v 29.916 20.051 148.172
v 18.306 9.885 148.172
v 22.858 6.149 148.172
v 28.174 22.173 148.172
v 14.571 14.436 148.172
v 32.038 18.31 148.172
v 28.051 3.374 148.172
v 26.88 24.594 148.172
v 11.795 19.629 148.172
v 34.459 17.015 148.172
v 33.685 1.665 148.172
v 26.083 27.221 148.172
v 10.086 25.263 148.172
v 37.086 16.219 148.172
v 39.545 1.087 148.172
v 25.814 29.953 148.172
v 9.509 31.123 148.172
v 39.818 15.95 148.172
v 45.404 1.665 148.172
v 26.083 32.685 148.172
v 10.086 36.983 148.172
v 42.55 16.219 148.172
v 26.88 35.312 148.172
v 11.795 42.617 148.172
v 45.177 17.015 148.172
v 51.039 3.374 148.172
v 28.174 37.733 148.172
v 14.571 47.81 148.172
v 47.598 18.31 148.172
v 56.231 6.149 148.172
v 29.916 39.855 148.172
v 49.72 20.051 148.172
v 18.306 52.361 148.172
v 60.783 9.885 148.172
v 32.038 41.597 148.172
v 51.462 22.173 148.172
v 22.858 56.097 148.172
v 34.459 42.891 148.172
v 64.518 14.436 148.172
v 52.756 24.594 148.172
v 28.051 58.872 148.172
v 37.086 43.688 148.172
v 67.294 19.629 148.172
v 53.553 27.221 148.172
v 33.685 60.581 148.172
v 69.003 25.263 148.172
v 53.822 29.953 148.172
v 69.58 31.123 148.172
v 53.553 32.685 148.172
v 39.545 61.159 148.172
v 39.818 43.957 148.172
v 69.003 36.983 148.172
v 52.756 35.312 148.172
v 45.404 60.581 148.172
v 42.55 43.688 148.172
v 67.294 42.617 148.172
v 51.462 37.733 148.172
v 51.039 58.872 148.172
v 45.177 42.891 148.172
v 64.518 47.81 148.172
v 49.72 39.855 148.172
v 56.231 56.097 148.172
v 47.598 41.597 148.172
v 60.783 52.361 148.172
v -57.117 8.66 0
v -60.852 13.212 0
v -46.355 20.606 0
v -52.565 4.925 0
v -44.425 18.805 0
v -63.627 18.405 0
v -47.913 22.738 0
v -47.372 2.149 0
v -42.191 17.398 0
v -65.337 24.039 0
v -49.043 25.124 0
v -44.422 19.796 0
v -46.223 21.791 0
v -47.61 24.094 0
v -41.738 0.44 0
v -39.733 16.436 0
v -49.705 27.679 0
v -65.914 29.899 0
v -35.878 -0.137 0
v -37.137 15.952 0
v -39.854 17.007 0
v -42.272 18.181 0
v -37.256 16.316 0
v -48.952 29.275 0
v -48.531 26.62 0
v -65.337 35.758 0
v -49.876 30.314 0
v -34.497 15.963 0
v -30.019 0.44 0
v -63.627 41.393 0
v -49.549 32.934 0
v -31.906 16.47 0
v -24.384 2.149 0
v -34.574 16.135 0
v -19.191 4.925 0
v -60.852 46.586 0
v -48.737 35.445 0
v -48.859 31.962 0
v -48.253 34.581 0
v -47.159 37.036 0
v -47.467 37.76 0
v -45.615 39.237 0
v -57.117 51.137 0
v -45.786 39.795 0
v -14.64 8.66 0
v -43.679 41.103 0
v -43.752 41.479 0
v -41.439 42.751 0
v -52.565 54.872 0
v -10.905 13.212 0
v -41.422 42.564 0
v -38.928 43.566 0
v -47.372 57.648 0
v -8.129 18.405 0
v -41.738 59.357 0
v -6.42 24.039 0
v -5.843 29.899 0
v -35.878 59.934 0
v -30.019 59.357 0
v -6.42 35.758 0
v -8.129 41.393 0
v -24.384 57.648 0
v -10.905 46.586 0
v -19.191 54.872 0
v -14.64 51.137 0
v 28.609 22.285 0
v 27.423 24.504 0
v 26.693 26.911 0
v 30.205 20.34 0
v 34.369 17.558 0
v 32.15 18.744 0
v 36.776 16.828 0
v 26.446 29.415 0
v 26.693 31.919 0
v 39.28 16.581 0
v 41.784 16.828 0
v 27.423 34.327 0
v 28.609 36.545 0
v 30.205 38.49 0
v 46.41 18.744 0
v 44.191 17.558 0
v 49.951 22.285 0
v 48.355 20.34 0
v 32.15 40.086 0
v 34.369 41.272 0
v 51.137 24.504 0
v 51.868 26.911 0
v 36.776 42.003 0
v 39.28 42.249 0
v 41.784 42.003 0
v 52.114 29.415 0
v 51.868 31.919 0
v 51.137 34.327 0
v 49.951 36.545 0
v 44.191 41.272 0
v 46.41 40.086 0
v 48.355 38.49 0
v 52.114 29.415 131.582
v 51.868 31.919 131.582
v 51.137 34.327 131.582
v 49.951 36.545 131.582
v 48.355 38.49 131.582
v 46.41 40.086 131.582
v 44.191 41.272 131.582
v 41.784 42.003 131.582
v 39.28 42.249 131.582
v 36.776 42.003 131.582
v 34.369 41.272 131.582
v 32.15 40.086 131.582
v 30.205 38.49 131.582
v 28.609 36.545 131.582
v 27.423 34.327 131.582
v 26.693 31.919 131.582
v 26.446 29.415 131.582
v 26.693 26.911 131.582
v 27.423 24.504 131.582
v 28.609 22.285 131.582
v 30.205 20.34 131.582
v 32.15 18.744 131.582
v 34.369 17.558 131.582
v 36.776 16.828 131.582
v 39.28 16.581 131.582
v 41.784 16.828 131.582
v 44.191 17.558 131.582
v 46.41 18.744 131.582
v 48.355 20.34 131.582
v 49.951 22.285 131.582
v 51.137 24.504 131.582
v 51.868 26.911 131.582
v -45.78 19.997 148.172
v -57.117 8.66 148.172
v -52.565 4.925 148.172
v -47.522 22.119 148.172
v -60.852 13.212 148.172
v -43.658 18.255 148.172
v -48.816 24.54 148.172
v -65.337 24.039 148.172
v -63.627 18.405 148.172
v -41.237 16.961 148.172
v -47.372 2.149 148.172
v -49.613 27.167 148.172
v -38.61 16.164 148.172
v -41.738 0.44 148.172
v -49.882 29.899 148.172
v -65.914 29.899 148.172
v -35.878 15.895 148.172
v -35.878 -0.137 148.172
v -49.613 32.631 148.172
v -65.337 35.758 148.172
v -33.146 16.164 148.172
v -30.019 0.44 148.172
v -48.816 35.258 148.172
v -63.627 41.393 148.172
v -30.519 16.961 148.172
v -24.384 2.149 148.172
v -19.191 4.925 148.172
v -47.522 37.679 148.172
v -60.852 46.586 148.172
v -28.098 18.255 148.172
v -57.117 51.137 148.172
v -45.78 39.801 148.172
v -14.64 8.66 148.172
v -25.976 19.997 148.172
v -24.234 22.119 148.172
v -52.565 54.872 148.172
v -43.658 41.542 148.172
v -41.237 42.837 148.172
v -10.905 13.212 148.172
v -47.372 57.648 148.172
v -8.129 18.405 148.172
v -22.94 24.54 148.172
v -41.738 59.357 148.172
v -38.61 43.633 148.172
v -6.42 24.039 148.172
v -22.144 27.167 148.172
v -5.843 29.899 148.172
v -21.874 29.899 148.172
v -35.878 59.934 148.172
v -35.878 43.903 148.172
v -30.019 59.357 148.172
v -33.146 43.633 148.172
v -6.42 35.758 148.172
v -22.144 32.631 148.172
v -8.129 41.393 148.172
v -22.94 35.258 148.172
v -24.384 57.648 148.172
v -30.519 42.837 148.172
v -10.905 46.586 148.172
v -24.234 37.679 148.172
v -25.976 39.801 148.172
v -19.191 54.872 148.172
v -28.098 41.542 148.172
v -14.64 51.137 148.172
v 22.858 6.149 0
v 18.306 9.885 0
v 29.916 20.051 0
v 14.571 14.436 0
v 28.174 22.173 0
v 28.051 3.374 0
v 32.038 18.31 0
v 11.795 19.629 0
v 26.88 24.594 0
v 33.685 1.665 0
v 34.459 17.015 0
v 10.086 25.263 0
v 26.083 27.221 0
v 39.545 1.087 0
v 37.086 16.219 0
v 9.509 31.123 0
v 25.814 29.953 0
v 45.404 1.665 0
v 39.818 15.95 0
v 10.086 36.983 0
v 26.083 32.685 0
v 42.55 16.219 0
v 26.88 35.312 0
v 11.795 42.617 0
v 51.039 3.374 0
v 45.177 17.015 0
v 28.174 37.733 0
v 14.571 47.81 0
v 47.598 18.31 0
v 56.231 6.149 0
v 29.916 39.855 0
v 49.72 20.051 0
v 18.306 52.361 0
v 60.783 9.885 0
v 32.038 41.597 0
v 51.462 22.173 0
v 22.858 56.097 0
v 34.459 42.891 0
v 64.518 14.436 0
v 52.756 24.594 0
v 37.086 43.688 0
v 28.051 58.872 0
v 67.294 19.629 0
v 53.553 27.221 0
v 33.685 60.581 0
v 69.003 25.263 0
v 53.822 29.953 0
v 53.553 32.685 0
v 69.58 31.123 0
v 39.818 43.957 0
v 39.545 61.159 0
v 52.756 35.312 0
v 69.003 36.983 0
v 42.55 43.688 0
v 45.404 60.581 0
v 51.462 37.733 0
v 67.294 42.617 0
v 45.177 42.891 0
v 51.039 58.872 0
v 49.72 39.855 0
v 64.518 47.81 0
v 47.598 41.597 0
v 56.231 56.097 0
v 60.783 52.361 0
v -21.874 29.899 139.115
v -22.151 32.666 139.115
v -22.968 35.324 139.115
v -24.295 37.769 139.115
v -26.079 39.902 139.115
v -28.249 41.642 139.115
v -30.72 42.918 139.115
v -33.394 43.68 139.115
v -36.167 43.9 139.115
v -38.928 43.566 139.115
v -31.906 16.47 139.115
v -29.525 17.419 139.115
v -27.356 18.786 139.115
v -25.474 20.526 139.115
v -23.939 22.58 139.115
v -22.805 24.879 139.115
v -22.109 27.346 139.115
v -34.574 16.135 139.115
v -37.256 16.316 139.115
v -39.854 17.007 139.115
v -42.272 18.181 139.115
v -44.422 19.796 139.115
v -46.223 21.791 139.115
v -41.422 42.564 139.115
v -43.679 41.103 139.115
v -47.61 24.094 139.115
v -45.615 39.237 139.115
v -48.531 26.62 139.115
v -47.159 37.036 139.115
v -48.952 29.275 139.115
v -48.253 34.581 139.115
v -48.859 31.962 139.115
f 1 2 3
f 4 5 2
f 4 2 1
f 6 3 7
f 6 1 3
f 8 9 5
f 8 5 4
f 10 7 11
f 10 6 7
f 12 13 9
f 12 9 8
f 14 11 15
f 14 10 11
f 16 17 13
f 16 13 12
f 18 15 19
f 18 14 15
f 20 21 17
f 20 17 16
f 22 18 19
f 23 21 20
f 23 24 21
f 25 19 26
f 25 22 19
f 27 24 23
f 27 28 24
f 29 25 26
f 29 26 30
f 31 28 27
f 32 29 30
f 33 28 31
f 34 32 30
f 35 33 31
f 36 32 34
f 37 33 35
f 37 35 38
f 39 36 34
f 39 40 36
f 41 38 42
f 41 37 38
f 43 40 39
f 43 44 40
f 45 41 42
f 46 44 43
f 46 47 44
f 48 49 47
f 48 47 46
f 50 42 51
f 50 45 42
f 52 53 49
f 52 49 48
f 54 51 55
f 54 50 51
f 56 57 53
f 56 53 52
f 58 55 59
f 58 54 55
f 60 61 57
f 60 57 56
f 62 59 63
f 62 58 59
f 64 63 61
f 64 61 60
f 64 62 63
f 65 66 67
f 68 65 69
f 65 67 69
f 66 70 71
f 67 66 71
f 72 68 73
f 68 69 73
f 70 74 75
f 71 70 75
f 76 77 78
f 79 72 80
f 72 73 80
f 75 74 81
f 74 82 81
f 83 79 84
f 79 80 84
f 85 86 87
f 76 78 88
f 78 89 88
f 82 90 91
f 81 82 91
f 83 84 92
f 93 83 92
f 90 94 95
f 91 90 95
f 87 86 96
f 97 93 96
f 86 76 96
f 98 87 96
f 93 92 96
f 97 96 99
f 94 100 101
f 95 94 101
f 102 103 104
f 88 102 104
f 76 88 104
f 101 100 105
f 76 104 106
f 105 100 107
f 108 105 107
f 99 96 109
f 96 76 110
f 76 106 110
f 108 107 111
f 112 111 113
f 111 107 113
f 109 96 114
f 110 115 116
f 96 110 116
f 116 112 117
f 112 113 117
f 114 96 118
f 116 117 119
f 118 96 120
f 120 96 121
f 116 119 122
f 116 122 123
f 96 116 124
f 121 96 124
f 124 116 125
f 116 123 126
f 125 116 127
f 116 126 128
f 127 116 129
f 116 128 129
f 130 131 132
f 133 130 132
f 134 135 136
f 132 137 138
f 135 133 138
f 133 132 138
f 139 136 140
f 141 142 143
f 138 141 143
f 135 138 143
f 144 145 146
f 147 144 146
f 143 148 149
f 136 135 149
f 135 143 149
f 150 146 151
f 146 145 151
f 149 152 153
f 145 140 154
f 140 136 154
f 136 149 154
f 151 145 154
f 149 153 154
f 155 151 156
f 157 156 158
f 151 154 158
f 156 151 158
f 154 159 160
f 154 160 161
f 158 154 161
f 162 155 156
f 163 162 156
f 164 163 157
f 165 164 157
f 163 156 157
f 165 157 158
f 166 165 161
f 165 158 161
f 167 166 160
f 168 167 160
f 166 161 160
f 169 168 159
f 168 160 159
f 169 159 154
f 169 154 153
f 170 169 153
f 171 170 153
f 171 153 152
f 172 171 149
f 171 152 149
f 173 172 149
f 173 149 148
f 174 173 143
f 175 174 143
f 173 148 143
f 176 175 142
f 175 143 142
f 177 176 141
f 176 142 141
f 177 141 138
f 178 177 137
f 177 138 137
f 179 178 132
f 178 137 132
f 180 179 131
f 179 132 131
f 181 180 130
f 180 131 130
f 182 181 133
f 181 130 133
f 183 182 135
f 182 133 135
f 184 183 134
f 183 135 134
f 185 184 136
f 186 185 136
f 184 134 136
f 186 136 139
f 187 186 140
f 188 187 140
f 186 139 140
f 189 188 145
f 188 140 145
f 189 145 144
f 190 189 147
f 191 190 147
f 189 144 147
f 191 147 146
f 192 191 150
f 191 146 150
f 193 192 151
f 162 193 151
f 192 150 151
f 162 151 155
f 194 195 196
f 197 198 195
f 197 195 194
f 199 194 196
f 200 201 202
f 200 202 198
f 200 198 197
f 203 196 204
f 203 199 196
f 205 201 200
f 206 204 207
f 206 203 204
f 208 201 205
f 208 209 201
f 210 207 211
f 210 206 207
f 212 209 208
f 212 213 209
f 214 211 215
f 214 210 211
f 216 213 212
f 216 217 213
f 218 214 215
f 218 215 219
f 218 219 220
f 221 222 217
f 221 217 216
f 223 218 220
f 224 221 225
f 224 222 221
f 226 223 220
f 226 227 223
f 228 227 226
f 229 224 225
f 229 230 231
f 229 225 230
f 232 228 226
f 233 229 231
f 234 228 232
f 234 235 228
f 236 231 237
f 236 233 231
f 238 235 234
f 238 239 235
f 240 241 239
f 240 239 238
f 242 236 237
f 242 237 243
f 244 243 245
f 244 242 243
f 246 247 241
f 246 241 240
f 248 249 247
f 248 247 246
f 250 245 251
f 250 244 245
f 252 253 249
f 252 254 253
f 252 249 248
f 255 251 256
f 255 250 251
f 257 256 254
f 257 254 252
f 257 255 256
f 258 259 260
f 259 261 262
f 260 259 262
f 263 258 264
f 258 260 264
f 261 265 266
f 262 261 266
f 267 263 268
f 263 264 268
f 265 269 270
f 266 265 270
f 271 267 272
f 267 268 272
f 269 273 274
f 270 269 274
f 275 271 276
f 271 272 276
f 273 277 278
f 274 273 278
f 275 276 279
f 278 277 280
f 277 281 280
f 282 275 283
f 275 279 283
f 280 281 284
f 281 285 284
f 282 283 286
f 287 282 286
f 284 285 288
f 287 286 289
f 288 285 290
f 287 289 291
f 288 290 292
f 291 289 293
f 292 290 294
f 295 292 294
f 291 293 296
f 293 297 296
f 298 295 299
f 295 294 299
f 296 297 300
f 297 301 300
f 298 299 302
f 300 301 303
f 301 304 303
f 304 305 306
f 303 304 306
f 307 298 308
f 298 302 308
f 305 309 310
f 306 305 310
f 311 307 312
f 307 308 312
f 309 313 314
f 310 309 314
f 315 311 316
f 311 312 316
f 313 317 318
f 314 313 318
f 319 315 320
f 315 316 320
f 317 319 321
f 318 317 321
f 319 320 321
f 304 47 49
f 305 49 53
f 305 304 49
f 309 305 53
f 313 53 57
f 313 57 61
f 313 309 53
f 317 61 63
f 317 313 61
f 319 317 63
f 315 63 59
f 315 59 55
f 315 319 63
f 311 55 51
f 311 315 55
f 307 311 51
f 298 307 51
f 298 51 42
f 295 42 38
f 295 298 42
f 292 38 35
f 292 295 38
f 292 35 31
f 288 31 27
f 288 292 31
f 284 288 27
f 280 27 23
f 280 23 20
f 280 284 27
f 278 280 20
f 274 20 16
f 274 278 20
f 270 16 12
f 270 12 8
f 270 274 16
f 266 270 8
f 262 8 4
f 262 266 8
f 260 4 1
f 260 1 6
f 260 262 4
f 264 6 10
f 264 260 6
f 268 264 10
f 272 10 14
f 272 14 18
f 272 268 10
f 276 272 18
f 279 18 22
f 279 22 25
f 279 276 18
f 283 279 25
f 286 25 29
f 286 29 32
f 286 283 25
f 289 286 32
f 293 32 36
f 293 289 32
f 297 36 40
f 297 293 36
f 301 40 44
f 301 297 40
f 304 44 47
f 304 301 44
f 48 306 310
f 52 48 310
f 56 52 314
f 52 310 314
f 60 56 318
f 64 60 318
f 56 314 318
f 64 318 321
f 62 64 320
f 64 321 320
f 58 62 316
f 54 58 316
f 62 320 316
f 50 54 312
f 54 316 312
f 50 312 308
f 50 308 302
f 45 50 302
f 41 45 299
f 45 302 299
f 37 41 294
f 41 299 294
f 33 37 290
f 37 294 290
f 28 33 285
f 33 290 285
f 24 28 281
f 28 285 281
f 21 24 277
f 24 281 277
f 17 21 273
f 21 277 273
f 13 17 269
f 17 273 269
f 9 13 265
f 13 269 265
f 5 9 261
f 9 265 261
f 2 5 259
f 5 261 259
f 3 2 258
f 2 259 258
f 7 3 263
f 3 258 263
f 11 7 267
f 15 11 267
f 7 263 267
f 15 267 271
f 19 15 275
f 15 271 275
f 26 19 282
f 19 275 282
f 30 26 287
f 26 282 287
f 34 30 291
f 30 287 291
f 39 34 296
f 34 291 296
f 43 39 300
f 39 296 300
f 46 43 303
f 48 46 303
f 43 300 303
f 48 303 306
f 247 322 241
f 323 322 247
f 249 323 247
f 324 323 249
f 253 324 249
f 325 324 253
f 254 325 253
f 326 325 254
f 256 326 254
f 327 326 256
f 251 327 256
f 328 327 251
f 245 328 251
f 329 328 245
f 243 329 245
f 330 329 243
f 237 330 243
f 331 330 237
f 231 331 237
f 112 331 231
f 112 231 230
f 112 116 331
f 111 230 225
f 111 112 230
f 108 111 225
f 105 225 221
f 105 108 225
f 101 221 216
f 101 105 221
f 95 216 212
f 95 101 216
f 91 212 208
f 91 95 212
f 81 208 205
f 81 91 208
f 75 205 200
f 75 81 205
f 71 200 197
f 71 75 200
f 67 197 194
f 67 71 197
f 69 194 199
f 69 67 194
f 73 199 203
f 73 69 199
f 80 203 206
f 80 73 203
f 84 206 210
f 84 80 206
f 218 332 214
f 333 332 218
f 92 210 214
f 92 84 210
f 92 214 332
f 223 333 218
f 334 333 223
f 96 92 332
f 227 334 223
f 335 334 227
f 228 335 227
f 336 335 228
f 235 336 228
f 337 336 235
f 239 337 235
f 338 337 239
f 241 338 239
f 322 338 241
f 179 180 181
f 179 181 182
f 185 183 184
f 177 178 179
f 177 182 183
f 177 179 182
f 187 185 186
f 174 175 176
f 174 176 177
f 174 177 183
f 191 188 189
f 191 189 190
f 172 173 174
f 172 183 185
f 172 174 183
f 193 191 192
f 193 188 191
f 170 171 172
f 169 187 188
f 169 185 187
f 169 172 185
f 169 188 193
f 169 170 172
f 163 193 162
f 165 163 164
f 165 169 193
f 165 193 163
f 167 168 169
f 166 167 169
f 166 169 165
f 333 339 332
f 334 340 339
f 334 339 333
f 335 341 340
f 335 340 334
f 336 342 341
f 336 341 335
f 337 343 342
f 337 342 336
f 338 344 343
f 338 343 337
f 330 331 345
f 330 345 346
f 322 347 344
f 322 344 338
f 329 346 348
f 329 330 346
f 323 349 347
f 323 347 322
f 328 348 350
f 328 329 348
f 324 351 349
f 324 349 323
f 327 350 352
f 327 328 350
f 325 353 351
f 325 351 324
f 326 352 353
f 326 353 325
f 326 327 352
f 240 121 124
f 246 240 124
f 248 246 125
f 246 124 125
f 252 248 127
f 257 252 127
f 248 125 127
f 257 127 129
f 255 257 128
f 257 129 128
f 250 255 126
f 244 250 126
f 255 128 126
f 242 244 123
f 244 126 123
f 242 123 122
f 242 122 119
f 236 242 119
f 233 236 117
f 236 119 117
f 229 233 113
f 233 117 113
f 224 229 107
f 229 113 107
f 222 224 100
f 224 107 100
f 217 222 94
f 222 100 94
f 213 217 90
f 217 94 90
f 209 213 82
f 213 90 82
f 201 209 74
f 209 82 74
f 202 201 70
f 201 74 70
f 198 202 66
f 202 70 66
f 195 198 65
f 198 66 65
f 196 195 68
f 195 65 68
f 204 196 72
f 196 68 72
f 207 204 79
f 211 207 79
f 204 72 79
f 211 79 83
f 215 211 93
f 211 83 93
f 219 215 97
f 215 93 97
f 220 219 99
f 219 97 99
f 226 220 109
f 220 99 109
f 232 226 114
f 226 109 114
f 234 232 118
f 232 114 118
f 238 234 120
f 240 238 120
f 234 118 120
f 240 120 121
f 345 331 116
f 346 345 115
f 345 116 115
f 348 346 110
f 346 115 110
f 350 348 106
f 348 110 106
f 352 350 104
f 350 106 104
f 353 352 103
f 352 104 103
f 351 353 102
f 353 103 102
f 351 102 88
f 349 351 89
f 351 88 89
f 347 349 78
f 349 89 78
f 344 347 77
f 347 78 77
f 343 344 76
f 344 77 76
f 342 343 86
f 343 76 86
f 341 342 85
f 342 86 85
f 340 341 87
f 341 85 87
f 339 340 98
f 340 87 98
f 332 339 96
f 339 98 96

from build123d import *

# Parameters (mm, degrees)
F0_R     = 30.035558
F0_R_2   = 14.003805
F1_DEPTH = 148.17244
F2_R     = 12.834035
F3_DEPTH = 131.58179
F2_R_2   = 14.003141
F4_DEPTH = 139.11495


with BuildPart() as f1:
    # F0 (on Top) → F1 (new body)
    with BuildSketch(Plane.XY):
        with Locations((-35.878228, 29.898721)):
            Circle(F0_R)
        with Locations((-35.878228, 29.898721)):
            Circle(F0_R_2, mode=Mode.SUBTRACT)
        with Locations((39.54463, 31.123056)):
            Circle(F0_R)
        with Locations((39.818168, 29.95331)):
            Circle(F0_R_2, mode=Mode.SUBTRACT)
    extrude(amount=F1_DEPTH)

    # F2 (on Top) → F4 (join)
    with BuildSketch(Plane.XY):
        with Locations((-34.975421, 30.13267)):
            Circle(F2_R_2)
    extrude(amount=F4_DEPTH)


with BuildPart() as f3:
    # F2 (on Top) → F3 (new body)
    with BuildSketch(Plane.XY):
        with Locations((39.28009, 29.415226)):
            Circle(F2_R)
    extrude(amount=F3_DEPTH)


solid = Compound([f1.part, f3.part])
